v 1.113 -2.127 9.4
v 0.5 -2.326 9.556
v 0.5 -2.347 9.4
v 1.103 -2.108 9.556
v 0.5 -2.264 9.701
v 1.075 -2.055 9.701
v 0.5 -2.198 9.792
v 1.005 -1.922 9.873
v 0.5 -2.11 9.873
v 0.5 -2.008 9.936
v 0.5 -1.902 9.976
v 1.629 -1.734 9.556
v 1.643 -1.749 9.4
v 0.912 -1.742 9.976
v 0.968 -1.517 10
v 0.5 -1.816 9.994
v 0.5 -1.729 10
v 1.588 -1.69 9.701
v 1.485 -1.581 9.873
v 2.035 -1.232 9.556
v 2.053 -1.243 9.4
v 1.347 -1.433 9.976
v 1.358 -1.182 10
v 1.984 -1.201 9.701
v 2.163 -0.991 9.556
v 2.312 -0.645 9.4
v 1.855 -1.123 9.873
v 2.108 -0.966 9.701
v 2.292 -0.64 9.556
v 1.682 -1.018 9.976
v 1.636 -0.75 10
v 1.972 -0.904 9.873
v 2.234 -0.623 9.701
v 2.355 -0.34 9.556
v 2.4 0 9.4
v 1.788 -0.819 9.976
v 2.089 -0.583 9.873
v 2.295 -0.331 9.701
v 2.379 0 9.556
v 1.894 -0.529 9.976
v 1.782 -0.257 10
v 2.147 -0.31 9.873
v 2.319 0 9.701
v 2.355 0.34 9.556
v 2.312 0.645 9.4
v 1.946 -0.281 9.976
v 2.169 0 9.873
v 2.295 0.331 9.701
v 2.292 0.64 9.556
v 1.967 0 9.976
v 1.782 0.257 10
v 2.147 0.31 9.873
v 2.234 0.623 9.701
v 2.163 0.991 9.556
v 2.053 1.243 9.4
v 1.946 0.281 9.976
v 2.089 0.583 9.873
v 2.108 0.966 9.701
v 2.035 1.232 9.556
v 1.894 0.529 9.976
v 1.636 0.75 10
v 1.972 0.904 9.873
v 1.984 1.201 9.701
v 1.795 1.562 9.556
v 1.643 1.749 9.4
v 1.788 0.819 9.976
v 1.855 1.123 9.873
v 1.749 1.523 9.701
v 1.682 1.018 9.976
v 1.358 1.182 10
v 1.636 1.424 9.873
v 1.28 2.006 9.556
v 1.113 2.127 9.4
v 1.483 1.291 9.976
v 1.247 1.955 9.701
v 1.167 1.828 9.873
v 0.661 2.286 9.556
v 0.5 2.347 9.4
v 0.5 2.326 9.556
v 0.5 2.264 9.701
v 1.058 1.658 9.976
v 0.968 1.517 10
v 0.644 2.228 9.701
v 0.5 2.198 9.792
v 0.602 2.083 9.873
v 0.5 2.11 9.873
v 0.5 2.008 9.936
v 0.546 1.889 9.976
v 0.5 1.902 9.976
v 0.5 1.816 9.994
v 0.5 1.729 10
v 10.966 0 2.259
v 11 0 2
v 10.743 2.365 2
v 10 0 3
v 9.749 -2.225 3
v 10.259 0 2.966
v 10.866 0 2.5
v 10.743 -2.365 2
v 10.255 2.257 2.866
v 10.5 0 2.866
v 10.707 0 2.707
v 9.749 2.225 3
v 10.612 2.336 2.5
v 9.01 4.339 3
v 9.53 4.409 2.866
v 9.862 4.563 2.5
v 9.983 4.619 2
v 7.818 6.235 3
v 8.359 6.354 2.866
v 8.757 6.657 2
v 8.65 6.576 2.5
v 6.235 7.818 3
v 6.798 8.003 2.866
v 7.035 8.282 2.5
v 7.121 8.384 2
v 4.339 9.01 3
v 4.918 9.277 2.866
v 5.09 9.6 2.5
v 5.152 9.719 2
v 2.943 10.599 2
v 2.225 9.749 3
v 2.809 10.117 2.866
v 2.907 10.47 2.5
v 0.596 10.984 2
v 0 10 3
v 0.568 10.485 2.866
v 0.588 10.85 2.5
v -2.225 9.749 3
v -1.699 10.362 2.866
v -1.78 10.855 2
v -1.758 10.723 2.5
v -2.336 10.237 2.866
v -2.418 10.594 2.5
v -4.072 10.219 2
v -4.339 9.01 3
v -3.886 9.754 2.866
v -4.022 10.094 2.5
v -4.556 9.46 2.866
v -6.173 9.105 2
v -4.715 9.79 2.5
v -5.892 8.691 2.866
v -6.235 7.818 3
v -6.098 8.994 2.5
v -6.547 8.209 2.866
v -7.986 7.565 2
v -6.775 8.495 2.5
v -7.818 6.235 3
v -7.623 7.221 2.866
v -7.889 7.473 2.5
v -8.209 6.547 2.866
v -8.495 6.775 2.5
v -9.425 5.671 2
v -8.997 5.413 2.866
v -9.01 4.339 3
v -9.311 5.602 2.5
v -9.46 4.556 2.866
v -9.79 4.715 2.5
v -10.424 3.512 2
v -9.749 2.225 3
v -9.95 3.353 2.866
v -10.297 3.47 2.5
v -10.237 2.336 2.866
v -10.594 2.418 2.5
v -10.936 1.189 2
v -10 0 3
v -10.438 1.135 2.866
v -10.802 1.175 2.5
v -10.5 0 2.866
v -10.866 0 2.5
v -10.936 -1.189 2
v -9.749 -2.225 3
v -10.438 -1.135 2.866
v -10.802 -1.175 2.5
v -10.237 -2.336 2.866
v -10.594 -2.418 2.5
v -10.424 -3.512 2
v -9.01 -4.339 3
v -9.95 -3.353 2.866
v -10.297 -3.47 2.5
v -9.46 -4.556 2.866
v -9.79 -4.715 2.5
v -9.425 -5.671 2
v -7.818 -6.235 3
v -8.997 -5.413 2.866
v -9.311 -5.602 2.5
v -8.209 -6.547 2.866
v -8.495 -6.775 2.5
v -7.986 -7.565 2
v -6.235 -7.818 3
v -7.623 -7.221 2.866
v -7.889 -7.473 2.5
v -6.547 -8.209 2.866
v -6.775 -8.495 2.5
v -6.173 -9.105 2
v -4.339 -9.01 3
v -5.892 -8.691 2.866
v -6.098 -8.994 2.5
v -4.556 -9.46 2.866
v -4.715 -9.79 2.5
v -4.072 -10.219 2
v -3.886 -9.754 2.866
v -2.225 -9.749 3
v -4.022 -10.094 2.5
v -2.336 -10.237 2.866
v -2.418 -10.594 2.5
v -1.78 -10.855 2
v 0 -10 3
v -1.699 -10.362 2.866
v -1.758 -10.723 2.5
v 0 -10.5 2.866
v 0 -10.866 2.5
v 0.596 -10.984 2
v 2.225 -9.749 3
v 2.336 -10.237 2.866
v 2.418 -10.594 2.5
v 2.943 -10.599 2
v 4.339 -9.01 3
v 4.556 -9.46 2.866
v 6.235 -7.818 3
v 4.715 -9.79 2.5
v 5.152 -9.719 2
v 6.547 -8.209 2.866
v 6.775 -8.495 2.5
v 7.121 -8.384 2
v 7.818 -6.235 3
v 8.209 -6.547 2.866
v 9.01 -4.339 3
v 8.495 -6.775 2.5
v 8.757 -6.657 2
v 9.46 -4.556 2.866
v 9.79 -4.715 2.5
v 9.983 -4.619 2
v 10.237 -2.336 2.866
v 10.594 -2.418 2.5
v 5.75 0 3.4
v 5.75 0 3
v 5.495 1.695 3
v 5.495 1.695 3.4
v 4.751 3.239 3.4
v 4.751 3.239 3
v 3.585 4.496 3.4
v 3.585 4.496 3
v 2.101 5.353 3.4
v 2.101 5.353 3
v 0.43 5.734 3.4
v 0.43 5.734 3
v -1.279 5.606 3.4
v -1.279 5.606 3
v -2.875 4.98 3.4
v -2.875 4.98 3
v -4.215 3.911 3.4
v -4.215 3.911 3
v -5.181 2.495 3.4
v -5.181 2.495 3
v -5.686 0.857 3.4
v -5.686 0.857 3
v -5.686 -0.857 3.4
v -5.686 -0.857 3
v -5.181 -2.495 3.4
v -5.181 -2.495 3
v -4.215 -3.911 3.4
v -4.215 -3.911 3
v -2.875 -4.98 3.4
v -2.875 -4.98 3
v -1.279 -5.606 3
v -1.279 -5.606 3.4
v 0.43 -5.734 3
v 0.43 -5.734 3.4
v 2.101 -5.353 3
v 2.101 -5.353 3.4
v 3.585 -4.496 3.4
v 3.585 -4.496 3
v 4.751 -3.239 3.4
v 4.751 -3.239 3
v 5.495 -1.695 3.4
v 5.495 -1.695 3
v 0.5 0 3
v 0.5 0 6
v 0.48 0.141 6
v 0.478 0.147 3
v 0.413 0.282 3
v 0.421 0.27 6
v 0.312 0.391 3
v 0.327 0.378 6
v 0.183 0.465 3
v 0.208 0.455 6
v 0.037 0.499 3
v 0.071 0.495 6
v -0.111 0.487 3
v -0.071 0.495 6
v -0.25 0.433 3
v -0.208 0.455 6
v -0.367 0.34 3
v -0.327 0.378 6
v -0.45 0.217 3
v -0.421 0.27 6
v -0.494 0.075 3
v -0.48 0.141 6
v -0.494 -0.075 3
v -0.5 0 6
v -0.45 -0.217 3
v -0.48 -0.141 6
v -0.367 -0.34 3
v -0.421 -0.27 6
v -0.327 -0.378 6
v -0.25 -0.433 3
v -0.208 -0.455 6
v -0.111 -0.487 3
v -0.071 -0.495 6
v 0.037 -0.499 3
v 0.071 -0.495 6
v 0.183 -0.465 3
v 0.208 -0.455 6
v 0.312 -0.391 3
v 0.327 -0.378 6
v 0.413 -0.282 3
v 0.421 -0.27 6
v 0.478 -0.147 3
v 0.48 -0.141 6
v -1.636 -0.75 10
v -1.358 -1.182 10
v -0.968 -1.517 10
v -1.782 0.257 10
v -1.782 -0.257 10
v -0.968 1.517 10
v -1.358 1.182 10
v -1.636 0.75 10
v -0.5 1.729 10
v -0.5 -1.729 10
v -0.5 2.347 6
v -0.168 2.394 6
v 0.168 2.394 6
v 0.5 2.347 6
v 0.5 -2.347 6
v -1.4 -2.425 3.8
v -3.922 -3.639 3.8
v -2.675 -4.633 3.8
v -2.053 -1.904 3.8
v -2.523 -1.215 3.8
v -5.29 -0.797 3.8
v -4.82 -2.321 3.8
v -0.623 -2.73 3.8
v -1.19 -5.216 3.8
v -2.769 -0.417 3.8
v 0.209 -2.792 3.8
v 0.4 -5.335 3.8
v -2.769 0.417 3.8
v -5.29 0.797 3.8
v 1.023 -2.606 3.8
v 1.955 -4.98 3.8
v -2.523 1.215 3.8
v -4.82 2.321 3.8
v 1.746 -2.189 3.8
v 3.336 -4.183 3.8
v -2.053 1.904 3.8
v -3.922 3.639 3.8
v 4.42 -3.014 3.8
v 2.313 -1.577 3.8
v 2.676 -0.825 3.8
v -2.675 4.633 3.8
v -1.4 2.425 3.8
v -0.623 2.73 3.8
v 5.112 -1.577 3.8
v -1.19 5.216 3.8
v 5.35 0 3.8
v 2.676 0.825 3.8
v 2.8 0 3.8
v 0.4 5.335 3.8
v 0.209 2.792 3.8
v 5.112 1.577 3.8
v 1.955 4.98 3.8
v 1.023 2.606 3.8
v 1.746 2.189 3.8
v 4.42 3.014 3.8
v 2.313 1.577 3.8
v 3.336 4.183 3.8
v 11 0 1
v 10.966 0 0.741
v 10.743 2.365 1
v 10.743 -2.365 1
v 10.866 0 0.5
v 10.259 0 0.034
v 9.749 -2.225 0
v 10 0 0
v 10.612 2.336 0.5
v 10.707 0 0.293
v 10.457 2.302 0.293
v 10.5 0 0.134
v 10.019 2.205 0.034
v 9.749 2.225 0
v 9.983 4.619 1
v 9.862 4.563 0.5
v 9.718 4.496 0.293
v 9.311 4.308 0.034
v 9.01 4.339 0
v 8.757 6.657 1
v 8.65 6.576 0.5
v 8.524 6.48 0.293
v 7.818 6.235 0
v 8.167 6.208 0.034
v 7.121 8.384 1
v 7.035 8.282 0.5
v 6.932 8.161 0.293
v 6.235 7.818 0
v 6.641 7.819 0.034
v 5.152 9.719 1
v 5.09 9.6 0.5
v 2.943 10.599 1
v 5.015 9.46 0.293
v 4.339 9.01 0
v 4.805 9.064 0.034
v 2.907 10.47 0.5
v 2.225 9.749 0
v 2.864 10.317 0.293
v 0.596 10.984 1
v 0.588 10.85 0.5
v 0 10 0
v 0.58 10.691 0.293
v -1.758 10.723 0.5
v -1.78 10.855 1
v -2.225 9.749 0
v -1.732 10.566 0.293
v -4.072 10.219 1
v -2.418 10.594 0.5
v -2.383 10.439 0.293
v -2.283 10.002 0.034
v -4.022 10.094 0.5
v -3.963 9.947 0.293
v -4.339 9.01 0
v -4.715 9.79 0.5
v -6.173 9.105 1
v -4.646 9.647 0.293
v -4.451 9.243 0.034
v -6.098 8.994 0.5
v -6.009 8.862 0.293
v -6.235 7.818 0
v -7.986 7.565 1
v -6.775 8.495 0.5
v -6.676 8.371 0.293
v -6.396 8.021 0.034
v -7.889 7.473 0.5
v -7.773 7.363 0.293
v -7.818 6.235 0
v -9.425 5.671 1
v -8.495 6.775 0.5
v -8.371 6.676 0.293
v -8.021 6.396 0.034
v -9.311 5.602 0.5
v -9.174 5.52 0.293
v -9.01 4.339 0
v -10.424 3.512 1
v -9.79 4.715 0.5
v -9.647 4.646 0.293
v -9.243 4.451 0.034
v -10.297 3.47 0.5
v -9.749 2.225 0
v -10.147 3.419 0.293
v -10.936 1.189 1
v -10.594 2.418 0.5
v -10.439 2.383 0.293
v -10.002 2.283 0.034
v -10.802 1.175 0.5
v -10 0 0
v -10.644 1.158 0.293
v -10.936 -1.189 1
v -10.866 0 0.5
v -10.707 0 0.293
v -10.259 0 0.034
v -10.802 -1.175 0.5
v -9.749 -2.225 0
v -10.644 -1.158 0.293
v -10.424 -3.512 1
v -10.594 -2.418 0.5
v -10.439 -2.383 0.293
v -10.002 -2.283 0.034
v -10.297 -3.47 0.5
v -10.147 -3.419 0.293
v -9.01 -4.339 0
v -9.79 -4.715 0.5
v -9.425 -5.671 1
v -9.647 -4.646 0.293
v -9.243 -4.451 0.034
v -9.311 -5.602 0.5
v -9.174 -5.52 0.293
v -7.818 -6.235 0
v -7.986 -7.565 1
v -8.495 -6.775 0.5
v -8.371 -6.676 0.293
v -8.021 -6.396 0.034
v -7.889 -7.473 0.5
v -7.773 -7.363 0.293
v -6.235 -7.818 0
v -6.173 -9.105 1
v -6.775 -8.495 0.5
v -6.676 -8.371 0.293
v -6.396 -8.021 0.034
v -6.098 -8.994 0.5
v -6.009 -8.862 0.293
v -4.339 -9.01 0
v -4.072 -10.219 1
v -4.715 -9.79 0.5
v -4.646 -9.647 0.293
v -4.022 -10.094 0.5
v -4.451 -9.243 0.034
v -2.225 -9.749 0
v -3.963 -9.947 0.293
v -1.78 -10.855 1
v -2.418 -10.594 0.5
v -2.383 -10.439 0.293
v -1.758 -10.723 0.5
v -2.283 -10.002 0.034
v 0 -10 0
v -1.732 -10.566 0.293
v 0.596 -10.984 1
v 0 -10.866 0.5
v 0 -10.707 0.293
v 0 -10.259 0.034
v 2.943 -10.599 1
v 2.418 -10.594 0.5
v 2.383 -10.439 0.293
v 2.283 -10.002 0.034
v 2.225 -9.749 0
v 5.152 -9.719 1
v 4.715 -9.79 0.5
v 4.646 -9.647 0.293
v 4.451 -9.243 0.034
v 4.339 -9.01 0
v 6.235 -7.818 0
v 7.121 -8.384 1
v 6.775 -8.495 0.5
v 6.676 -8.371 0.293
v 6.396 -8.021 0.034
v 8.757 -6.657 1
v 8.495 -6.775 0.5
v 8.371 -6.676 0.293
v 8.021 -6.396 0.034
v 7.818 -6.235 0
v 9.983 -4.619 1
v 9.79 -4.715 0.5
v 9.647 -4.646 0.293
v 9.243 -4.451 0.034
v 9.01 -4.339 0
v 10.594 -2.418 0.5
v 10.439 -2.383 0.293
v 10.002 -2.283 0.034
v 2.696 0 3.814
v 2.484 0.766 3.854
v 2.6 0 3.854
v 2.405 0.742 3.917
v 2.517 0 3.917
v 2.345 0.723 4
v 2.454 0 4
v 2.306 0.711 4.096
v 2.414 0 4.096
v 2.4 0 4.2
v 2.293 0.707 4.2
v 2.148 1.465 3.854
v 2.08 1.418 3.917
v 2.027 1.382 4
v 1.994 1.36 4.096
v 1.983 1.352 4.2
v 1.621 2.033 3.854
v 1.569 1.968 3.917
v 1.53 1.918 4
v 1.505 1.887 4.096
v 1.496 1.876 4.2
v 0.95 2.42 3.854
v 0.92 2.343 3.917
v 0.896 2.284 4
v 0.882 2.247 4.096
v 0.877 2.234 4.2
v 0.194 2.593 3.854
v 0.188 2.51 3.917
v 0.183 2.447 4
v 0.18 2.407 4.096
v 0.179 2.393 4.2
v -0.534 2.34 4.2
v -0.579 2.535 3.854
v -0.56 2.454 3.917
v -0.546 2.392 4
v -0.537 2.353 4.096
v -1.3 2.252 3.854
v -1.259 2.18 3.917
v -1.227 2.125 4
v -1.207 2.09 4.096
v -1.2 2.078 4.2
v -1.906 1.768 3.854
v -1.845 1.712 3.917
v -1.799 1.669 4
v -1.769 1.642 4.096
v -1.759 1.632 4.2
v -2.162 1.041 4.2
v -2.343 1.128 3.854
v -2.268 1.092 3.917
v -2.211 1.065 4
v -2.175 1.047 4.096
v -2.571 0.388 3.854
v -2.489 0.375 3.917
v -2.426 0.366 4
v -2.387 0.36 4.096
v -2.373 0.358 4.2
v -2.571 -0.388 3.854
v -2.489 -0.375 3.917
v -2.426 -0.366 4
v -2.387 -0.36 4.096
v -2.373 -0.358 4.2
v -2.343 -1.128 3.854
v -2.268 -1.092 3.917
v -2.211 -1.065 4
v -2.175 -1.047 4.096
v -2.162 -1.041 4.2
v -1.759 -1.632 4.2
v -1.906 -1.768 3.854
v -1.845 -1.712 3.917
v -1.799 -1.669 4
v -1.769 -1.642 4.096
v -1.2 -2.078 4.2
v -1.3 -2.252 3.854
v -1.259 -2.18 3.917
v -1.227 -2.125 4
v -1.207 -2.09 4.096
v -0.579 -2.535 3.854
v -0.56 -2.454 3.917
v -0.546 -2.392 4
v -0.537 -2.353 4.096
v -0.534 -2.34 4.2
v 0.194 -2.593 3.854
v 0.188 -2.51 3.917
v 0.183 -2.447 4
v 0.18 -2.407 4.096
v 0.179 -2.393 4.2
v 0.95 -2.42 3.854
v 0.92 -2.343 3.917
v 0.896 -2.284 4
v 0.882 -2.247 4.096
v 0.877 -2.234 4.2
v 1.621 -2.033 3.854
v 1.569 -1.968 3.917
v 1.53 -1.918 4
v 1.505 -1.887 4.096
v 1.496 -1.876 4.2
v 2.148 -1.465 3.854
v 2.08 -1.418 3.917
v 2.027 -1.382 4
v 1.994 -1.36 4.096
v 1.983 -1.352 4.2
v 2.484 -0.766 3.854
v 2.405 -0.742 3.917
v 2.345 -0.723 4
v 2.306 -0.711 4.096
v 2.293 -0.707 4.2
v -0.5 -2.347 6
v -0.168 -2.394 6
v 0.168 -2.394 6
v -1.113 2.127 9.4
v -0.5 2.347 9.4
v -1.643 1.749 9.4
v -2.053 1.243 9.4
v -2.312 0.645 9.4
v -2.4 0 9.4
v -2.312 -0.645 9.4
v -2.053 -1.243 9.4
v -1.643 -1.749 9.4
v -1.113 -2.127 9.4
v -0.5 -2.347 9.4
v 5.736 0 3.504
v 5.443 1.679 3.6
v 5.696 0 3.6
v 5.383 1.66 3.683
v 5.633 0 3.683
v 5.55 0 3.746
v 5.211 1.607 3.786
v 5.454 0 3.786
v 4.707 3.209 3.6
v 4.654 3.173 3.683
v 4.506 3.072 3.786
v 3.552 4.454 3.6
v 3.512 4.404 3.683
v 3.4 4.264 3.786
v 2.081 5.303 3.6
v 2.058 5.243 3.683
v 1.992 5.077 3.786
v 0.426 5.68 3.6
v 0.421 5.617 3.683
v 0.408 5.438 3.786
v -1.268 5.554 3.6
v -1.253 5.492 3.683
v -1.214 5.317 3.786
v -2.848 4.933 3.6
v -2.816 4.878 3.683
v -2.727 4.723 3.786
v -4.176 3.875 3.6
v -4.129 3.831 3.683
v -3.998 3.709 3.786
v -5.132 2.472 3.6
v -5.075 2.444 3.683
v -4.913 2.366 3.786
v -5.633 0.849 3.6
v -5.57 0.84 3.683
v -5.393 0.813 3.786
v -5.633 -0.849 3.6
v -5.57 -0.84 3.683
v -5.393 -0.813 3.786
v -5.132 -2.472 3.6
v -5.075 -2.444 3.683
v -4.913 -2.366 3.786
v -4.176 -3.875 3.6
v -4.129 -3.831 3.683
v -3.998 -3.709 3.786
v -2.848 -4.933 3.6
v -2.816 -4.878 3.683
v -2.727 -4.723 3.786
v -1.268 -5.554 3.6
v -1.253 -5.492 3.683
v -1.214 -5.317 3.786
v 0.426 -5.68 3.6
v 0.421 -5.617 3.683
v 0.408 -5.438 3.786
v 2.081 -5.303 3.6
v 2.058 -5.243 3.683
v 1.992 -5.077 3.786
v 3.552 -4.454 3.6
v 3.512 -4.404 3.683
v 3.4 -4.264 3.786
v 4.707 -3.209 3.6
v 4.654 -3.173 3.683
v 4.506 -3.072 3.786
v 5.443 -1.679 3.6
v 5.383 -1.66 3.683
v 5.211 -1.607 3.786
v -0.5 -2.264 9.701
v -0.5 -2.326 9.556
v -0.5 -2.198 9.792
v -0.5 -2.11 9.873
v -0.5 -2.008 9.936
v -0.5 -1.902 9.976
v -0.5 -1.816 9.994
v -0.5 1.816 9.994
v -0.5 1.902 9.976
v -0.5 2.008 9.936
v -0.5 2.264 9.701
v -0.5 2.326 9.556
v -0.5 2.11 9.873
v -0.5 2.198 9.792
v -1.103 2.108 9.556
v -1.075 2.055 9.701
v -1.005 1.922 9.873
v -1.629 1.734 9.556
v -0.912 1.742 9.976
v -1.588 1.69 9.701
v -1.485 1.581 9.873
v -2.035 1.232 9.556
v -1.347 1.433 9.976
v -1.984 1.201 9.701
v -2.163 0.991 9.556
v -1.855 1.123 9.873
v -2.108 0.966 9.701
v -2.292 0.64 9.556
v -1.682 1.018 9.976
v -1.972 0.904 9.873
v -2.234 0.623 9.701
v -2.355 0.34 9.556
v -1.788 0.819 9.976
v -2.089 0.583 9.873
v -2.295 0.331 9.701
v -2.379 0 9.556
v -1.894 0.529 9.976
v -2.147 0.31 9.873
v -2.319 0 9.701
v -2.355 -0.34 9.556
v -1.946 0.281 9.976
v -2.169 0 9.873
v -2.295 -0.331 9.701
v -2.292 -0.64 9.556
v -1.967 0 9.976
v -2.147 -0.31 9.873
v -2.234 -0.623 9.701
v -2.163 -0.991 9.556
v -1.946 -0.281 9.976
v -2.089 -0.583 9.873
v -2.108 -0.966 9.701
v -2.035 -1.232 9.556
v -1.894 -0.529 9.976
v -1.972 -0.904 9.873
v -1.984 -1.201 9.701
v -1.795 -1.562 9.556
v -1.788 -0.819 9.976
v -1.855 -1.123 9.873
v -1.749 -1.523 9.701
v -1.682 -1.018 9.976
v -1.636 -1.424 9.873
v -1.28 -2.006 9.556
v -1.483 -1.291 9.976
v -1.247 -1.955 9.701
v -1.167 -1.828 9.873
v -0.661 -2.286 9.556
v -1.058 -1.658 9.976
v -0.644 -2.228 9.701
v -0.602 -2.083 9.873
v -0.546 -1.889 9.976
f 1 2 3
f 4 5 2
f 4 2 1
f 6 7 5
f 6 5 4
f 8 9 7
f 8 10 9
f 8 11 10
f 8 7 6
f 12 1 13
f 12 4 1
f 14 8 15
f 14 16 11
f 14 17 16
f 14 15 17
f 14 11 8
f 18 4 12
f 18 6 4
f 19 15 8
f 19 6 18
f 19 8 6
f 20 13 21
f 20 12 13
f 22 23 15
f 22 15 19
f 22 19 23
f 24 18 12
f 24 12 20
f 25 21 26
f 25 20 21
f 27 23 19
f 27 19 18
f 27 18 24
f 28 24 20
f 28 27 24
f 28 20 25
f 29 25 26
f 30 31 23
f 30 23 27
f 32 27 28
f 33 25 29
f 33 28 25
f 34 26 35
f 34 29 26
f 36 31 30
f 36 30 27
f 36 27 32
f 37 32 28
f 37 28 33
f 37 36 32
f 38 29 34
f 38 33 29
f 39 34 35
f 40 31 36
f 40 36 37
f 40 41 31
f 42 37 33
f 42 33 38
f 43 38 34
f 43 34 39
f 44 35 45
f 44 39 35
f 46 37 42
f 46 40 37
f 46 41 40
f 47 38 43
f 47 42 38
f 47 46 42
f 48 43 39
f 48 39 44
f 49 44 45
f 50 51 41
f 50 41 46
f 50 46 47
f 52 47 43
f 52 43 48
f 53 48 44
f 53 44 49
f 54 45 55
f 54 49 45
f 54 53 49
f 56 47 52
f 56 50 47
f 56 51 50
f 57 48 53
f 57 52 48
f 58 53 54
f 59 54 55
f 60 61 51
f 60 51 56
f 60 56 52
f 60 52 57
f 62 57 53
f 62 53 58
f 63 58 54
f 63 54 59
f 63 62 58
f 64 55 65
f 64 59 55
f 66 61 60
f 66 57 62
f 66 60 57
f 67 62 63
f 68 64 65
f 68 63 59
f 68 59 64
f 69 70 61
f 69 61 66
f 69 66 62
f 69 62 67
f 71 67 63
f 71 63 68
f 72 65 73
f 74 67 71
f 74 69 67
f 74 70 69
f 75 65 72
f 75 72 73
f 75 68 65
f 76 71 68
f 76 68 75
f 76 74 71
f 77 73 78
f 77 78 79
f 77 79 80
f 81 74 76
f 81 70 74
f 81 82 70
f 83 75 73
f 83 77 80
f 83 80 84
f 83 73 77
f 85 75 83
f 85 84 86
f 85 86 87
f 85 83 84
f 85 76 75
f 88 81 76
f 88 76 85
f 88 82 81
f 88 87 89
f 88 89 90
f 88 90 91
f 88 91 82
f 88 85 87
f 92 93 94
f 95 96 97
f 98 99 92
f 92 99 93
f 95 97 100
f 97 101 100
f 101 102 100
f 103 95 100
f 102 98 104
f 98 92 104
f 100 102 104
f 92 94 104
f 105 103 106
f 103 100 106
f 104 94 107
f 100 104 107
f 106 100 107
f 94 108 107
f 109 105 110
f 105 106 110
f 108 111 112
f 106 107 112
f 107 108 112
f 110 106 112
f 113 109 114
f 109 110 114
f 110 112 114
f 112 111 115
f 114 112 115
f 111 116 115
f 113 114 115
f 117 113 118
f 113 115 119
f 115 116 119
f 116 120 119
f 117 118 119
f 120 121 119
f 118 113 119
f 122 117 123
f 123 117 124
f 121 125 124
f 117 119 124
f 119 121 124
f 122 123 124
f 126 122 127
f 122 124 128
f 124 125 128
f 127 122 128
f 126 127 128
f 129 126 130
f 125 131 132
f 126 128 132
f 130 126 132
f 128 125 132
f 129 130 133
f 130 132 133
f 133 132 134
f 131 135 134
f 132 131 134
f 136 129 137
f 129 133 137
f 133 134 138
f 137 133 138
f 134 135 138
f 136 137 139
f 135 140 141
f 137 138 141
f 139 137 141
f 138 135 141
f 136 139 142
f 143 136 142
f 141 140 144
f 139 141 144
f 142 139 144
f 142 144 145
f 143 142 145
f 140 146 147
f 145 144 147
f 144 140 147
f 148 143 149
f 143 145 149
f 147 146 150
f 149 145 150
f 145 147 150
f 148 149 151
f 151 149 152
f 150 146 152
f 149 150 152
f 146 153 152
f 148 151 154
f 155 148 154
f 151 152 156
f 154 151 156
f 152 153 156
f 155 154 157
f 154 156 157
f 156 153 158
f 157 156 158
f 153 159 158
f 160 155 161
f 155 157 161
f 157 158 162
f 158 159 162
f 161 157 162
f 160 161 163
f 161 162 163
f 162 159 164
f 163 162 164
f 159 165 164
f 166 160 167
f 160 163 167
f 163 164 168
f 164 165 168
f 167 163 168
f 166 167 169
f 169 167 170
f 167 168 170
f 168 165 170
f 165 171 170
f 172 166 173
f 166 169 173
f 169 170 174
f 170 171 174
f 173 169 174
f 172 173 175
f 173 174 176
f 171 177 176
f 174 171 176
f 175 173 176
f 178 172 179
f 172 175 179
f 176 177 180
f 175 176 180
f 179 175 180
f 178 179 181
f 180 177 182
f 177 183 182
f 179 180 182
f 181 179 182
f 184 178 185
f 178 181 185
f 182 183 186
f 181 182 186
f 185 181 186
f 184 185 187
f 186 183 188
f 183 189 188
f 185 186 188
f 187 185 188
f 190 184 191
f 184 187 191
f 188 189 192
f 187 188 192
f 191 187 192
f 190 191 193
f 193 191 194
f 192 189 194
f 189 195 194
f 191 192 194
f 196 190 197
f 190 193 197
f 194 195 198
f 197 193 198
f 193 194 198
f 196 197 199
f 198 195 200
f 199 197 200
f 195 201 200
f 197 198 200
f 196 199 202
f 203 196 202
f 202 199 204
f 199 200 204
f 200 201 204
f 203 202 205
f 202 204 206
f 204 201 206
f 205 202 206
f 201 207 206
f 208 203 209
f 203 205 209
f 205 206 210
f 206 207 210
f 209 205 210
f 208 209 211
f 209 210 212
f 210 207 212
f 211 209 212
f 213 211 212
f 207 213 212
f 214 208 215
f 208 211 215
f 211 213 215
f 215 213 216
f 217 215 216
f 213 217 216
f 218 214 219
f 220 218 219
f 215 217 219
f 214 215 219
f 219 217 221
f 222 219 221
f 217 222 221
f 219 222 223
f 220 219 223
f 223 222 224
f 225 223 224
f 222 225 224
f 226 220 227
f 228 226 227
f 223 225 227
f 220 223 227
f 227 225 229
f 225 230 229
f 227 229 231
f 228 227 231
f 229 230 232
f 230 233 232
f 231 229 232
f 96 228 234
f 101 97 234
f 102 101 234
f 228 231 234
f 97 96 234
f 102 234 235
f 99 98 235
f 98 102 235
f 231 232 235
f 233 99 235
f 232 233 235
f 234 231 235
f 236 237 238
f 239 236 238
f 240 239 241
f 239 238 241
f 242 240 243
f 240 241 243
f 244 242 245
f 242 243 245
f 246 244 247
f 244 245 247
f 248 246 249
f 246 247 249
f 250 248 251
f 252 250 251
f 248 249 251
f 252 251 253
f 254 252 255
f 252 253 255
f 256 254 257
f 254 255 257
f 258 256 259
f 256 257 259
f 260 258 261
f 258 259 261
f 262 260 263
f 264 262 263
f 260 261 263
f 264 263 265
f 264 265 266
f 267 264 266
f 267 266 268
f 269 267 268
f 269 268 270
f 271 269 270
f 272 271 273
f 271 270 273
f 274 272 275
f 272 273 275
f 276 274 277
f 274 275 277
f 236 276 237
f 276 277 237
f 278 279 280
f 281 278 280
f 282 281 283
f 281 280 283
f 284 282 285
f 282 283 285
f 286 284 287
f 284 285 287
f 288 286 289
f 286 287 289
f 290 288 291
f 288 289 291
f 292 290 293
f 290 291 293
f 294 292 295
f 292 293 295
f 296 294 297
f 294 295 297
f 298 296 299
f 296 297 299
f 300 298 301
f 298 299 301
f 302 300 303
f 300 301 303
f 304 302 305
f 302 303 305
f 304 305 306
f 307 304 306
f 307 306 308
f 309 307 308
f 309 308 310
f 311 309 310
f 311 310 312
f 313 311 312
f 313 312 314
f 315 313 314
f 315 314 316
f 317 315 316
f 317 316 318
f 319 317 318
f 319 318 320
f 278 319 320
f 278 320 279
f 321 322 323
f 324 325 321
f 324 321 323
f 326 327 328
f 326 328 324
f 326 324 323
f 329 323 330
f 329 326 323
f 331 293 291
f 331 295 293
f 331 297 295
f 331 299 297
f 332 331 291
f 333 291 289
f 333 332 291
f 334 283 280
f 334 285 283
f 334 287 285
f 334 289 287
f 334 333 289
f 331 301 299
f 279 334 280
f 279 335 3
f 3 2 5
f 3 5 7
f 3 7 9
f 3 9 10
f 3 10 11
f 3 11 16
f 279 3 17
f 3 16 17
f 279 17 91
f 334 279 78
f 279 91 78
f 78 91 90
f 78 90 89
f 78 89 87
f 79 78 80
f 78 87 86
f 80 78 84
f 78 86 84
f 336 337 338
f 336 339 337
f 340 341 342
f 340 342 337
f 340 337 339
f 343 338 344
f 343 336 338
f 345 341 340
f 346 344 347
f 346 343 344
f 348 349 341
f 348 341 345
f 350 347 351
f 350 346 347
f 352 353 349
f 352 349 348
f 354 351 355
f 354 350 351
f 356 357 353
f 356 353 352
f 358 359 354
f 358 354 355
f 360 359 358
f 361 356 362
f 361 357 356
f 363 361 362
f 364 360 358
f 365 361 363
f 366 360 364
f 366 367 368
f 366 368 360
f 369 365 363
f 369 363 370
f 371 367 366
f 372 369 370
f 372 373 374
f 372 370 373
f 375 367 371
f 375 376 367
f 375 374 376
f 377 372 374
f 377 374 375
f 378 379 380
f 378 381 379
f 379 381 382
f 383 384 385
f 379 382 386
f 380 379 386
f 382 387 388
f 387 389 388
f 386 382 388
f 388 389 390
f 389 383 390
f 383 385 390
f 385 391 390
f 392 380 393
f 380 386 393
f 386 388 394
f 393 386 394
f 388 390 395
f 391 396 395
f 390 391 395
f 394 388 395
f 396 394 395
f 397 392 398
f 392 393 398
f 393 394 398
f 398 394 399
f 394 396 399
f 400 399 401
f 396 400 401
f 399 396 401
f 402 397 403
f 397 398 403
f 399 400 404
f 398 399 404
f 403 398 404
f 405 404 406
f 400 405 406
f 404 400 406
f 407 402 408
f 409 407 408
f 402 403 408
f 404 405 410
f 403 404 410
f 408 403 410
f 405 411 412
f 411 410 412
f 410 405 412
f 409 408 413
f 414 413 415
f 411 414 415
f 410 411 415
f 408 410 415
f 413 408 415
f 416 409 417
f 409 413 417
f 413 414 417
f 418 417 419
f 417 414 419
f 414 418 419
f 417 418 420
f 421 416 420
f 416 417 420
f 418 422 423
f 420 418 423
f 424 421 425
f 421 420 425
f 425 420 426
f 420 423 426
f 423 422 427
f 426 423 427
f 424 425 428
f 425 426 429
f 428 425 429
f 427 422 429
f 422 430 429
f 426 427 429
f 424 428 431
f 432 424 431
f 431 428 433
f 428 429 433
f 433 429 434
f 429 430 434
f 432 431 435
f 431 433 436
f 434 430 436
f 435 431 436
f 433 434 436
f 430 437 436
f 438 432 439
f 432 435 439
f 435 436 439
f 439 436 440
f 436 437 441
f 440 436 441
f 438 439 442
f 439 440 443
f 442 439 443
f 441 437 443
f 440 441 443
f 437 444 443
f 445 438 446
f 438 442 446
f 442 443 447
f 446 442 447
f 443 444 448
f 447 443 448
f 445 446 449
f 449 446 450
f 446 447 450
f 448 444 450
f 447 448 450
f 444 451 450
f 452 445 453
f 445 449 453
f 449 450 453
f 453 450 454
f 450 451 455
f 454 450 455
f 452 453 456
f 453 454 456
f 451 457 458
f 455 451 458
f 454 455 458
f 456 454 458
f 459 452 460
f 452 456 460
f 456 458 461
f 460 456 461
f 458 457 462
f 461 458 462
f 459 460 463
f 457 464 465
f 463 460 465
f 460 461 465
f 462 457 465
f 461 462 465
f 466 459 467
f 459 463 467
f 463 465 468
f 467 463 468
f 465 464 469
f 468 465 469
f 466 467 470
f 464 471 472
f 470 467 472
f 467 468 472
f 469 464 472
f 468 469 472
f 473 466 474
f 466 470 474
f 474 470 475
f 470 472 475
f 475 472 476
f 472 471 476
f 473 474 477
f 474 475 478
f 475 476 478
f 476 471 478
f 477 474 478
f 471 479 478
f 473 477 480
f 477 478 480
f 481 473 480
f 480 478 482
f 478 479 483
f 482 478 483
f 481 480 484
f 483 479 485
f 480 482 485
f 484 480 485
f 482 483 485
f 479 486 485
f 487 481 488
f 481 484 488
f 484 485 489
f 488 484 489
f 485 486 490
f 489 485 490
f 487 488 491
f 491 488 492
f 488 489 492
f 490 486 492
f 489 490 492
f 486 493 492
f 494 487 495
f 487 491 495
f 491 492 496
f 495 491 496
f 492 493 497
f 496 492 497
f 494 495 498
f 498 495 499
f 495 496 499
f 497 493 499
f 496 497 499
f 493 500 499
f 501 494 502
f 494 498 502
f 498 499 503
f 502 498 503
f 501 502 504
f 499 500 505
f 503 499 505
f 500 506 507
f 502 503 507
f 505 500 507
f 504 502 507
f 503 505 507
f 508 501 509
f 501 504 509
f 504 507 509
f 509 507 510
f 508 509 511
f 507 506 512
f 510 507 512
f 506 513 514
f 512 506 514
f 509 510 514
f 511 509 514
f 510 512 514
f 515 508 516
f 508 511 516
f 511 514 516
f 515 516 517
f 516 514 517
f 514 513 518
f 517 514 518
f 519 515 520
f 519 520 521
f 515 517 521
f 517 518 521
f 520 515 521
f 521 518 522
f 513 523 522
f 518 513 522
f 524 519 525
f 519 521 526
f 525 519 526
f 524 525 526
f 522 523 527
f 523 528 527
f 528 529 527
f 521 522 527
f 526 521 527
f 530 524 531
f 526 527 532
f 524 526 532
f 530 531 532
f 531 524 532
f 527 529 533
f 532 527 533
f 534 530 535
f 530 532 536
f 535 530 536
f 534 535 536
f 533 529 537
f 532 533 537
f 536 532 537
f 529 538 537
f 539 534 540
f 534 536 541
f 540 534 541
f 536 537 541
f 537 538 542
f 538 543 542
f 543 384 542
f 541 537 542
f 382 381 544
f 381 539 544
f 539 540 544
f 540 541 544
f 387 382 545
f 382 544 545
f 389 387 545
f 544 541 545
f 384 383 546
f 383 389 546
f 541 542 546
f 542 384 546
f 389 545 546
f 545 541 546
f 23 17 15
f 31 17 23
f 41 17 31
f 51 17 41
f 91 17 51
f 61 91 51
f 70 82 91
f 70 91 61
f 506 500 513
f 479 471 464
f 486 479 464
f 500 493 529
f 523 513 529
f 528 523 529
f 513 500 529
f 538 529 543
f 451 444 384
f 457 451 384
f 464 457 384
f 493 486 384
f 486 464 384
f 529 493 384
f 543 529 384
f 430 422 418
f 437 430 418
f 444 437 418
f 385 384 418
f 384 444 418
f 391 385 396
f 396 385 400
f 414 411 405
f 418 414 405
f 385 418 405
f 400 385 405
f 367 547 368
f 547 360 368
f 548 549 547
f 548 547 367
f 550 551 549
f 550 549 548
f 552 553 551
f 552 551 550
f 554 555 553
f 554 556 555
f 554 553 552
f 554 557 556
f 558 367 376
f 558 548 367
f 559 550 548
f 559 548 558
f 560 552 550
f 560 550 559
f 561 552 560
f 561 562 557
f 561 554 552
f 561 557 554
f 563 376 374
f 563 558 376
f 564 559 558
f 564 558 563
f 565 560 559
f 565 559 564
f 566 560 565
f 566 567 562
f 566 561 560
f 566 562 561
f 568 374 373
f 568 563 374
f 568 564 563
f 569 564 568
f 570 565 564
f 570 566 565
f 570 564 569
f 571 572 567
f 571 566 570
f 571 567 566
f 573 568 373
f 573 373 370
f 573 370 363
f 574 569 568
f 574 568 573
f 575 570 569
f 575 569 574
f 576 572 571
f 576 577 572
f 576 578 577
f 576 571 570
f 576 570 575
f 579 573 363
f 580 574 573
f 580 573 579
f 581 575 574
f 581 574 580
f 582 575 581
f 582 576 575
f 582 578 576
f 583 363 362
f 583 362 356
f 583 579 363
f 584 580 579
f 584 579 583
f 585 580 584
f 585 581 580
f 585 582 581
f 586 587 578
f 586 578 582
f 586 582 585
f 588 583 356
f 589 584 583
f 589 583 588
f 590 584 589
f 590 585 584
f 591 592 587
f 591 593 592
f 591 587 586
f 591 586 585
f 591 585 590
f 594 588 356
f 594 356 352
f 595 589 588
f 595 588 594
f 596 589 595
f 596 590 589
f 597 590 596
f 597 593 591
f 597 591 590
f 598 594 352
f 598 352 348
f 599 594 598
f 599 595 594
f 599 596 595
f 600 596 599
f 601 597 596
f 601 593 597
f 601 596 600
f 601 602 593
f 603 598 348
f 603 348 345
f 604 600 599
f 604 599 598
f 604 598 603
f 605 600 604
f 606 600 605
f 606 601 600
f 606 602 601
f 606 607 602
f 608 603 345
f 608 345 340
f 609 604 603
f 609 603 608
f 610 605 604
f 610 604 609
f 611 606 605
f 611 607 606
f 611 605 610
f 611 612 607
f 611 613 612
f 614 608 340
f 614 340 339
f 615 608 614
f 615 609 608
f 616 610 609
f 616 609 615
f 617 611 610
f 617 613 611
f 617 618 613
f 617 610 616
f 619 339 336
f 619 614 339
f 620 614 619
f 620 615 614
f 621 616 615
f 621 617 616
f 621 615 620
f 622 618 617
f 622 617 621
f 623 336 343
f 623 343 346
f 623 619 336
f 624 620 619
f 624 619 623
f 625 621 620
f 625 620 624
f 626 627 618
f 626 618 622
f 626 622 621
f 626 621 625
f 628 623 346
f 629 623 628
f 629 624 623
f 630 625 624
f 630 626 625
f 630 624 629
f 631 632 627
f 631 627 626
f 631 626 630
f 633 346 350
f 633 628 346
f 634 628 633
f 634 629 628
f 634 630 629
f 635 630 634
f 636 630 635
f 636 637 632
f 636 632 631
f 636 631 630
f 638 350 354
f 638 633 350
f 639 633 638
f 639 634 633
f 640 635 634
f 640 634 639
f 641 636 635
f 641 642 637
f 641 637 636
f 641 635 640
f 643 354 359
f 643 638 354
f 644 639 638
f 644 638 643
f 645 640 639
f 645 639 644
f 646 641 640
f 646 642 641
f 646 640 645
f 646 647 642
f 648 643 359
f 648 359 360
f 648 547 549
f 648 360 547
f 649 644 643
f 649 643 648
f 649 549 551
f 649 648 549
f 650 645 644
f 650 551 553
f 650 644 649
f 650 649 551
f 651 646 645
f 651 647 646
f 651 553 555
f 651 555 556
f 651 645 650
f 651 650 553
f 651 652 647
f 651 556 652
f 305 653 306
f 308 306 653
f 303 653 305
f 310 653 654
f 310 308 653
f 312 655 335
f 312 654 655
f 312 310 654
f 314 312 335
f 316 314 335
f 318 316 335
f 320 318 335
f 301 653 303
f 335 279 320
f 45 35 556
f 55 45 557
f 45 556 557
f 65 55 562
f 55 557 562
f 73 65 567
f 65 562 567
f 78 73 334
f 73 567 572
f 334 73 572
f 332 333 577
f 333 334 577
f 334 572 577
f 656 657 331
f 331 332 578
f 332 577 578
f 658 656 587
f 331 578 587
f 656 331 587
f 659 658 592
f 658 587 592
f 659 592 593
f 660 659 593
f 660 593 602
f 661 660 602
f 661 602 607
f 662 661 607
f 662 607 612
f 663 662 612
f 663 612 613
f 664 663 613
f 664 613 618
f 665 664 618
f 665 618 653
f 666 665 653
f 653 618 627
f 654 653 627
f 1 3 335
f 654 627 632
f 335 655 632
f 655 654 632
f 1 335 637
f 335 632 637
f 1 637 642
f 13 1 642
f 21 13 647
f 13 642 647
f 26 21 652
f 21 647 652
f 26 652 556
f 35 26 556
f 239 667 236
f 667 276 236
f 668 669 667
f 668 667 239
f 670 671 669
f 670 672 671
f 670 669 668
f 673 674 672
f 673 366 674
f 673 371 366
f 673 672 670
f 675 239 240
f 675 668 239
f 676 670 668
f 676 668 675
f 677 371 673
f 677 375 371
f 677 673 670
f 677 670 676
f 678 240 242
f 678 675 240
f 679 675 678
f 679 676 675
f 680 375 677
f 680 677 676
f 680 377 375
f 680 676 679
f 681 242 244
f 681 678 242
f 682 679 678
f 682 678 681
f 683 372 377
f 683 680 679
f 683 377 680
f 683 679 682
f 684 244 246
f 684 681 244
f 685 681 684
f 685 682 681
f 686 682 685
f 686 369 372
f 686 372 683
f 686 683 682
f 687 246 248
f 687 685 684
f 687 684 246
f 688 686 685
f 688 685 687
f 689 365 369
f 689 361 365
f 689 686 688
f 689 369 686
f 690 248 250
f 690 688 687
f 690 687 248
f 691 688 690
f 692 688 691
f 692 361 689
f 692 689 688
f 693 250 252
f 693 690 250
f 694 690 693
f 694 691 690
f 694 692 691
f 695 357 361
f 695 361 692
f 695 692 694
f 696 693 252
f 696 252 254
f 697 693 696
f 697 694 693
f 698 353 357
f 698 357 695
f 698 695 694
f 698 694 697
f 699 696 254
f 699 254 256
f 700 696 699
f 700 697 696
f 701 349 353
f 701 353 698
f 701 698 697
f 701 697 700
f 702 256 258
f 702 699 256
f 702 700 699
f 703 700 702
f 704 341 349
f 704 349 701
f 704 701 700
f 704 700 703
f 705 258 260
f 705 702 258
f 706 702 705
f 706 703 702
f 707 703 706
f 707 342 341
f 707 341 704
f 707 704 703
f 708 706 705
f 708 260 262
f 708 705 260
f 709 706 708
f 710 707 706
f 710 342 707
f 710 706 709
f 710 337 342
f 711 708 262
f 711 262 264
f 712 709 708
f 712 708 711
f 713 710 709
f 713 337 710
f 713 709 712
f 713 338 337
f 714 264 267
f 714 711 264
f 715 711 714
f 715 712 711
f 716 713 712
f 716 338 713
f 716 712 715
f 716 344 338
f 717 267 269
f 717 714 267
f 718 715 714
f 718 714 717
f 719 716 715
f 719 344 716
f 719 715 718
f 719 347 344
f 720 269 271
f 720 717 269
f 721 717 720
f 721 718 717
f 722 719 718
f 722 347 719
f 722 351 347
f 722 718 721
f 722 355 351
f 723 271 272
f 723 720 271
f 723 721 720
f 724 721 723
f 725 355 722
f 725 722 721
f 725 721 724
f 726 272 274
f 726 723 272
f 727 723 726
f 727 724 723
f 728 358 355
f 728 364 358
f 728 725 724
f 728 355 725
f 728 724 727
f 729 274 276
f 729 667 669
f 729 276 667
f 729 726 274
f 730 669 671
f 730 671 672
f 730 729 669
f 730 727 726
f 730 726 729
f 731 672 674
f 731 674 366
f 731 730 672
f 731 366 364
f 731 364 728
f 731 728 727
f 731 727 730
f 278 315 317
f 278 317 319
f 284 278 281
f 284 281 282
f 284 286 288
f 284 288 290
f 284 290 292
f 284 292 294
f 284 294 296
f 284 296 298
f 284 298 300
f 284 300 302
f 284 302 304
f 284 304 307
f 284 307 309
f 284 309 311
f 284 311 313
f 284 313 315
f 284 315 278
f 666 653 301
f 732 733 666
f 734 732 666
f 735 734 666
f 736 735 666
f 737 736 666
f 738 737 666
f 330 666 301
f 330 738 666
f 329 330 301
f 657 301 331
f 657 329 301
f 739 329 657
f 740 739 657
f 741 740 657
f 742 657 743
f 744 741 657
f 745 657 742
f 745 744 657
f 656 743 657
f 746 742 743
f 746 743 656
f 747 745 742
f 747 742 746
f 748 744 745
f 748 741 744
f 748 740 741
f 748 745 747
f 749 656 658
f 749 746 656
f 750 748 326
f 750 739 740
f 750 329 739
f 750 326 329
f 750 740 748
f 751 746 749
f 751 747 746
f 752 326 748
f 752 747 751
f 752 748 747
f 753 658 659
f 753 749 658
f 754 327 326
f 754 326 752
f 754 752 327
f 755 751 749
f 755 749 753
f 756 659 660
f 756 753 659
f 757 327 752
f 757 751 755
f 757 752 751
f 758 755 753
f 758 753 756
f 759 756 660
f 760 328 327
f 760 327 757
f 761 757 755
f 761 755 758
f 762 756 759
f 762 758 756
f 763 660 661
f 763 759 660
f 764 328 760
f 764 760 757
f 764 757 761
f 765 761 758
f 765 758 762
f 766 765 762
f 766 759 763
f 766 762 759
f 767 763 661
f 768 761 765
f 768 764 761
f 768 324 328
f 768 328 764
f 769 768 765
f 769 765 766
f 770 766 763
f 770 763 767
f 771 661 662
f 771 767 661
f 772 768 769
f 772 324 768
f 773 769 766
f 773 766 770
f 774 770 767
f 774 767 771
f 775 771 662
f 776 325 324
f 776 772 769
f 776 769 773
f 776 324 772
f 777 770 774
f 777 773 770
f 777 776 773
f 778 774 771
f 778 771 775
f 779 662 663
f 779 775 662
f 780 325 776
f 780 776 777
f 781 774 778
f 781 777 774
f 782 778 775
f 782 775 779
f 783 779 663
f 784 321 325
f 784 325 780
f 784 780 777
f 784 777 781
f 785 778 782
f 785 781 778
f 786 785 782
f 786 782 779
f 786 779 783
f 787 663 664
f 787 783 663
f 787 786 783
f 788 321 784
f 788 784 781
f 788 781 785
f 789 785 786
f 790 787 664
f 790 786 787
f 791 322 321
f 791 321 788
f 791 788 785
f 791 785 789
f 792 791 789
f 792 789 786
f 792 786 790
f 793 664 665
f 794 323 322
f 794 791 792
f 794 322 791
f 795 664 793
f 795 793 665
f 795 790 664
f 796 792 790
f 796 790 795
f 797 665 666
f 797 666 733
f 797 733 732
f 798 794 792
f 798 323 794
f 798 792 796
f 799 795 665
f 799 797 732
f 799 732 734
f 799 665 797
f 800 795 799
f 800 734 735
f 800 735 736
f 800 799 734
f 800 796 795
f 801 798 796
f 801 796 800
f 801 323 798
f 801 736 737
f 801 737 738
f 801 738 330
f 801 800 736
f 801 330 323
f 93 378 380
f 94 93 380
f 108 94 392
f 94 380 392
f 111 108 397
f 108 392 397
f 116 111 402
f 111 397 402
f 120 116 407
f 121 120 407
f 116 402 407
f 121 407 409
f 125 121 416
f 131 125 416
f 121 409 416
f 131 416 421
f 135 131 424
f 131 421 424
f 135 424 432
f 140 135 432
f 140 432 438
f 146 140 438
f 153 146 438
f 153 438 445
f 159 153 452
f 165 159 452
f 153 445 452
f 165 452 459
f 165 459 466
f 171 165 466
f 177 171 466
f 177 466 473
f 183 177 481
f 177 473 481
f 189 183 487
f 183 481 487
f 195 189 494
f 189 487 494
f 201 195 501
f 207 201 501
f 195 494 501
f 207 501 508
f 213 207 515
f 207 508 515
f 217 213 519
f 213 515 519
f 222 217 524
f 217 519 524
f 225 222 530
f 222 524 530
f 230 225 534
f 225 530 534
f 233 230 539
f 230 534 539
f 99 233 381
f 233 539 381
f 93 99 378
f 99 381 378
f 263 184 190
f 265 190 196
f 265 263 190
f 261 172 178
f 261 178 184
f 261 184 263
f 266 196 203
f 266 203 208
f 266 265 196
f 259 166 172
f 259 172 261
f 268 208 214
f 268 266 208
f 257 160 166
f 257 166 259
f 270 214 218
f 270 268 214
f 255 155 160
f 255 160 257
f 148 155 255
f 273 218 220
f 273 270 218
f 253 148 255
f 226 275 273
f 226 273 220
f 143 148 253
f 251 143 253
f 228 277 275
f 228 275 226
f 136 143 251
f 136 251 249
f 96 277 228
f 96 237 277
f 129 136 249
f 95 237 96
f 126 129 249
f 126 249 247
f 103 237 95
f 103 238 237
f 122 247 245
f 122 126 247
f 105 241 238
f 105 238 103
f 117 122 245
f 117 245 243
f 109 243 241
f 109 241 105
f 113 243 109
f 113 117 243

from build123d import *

# Parameters (mm, degrees)
F0_R      = 11
F1_DEPTH  = 3
F2_R      = 5.75
F3_DEPTH  = 0.8
F4_R      = 2.4
F5_DEPTH  = 6.2
F6_R      = 0.5
F9_DEPTH  = 7
F10_W     = 1
F10_H     = 8.5789565172
F11_DEPTH = 4
F12_R     = 0.6
F13_R     = 1
F14_R     = 0.4


with BuildPart() as f1:
    # F0 (on Top) → F1 (new body)
    with BuildSketch(Plane.XY):
        Circle(F0_R)
    extrude(amount=F1_DEPTH)

    # F2 (on face) → F3 (join)
    with BuildSketch(Plane.XY.offset(3)):
        Circle(F2_R)
    extrude(amount=F3_DEPTH)

    # F4 (on face) → F5 (join)
    with BuildSketch(Plane.XY.offset(3.8)):
        Circle(F4_R)
    extrude(amount=F5_DEPTH)

    # F6 (on face) → F9 (cut)
    with BuildSketch(Plane.XY.offset(10)):
        Circle(F6_R)
    extrude(amount=-F9_DEPTH, mode=Mode.SUBTRACT)

    # F10 (on face) → F11 (cut)
    with BuildSketch(Plane.XY.offset(10)):
        Rectangle(F10_W, F10_H)
    extrude(amount=-F11_DEPTH, mode=Mode.SUBTRACT)

    # F12
    f12_edges = [f1.edges().sort_by_distance(p)[0] for p in [
        (-2.4, 0, 10),
        (1.865476, -1.509967, 10),
        (1.865476, 1.509967, 10),
    ]]
    fillet(f12_edges, radius=F12_R)

    # F13
    f13_edges = [f1.edges().sort_by_distance(p)[0] for p in [
        (-11, 0, 3),
        (-11, 0, 0),
    ]]
    fillet(f13_edges, radius=F13_R)

    # F14
    f14_edges = [f1.edges().sort_by_distance(p)[0] for p in [
        (-5.75, 0, 3.8),
        (-2.4, 0, 3.8),
    ]]
    fillet(f14_edges, radius=F14_R)


solid = f1.part
